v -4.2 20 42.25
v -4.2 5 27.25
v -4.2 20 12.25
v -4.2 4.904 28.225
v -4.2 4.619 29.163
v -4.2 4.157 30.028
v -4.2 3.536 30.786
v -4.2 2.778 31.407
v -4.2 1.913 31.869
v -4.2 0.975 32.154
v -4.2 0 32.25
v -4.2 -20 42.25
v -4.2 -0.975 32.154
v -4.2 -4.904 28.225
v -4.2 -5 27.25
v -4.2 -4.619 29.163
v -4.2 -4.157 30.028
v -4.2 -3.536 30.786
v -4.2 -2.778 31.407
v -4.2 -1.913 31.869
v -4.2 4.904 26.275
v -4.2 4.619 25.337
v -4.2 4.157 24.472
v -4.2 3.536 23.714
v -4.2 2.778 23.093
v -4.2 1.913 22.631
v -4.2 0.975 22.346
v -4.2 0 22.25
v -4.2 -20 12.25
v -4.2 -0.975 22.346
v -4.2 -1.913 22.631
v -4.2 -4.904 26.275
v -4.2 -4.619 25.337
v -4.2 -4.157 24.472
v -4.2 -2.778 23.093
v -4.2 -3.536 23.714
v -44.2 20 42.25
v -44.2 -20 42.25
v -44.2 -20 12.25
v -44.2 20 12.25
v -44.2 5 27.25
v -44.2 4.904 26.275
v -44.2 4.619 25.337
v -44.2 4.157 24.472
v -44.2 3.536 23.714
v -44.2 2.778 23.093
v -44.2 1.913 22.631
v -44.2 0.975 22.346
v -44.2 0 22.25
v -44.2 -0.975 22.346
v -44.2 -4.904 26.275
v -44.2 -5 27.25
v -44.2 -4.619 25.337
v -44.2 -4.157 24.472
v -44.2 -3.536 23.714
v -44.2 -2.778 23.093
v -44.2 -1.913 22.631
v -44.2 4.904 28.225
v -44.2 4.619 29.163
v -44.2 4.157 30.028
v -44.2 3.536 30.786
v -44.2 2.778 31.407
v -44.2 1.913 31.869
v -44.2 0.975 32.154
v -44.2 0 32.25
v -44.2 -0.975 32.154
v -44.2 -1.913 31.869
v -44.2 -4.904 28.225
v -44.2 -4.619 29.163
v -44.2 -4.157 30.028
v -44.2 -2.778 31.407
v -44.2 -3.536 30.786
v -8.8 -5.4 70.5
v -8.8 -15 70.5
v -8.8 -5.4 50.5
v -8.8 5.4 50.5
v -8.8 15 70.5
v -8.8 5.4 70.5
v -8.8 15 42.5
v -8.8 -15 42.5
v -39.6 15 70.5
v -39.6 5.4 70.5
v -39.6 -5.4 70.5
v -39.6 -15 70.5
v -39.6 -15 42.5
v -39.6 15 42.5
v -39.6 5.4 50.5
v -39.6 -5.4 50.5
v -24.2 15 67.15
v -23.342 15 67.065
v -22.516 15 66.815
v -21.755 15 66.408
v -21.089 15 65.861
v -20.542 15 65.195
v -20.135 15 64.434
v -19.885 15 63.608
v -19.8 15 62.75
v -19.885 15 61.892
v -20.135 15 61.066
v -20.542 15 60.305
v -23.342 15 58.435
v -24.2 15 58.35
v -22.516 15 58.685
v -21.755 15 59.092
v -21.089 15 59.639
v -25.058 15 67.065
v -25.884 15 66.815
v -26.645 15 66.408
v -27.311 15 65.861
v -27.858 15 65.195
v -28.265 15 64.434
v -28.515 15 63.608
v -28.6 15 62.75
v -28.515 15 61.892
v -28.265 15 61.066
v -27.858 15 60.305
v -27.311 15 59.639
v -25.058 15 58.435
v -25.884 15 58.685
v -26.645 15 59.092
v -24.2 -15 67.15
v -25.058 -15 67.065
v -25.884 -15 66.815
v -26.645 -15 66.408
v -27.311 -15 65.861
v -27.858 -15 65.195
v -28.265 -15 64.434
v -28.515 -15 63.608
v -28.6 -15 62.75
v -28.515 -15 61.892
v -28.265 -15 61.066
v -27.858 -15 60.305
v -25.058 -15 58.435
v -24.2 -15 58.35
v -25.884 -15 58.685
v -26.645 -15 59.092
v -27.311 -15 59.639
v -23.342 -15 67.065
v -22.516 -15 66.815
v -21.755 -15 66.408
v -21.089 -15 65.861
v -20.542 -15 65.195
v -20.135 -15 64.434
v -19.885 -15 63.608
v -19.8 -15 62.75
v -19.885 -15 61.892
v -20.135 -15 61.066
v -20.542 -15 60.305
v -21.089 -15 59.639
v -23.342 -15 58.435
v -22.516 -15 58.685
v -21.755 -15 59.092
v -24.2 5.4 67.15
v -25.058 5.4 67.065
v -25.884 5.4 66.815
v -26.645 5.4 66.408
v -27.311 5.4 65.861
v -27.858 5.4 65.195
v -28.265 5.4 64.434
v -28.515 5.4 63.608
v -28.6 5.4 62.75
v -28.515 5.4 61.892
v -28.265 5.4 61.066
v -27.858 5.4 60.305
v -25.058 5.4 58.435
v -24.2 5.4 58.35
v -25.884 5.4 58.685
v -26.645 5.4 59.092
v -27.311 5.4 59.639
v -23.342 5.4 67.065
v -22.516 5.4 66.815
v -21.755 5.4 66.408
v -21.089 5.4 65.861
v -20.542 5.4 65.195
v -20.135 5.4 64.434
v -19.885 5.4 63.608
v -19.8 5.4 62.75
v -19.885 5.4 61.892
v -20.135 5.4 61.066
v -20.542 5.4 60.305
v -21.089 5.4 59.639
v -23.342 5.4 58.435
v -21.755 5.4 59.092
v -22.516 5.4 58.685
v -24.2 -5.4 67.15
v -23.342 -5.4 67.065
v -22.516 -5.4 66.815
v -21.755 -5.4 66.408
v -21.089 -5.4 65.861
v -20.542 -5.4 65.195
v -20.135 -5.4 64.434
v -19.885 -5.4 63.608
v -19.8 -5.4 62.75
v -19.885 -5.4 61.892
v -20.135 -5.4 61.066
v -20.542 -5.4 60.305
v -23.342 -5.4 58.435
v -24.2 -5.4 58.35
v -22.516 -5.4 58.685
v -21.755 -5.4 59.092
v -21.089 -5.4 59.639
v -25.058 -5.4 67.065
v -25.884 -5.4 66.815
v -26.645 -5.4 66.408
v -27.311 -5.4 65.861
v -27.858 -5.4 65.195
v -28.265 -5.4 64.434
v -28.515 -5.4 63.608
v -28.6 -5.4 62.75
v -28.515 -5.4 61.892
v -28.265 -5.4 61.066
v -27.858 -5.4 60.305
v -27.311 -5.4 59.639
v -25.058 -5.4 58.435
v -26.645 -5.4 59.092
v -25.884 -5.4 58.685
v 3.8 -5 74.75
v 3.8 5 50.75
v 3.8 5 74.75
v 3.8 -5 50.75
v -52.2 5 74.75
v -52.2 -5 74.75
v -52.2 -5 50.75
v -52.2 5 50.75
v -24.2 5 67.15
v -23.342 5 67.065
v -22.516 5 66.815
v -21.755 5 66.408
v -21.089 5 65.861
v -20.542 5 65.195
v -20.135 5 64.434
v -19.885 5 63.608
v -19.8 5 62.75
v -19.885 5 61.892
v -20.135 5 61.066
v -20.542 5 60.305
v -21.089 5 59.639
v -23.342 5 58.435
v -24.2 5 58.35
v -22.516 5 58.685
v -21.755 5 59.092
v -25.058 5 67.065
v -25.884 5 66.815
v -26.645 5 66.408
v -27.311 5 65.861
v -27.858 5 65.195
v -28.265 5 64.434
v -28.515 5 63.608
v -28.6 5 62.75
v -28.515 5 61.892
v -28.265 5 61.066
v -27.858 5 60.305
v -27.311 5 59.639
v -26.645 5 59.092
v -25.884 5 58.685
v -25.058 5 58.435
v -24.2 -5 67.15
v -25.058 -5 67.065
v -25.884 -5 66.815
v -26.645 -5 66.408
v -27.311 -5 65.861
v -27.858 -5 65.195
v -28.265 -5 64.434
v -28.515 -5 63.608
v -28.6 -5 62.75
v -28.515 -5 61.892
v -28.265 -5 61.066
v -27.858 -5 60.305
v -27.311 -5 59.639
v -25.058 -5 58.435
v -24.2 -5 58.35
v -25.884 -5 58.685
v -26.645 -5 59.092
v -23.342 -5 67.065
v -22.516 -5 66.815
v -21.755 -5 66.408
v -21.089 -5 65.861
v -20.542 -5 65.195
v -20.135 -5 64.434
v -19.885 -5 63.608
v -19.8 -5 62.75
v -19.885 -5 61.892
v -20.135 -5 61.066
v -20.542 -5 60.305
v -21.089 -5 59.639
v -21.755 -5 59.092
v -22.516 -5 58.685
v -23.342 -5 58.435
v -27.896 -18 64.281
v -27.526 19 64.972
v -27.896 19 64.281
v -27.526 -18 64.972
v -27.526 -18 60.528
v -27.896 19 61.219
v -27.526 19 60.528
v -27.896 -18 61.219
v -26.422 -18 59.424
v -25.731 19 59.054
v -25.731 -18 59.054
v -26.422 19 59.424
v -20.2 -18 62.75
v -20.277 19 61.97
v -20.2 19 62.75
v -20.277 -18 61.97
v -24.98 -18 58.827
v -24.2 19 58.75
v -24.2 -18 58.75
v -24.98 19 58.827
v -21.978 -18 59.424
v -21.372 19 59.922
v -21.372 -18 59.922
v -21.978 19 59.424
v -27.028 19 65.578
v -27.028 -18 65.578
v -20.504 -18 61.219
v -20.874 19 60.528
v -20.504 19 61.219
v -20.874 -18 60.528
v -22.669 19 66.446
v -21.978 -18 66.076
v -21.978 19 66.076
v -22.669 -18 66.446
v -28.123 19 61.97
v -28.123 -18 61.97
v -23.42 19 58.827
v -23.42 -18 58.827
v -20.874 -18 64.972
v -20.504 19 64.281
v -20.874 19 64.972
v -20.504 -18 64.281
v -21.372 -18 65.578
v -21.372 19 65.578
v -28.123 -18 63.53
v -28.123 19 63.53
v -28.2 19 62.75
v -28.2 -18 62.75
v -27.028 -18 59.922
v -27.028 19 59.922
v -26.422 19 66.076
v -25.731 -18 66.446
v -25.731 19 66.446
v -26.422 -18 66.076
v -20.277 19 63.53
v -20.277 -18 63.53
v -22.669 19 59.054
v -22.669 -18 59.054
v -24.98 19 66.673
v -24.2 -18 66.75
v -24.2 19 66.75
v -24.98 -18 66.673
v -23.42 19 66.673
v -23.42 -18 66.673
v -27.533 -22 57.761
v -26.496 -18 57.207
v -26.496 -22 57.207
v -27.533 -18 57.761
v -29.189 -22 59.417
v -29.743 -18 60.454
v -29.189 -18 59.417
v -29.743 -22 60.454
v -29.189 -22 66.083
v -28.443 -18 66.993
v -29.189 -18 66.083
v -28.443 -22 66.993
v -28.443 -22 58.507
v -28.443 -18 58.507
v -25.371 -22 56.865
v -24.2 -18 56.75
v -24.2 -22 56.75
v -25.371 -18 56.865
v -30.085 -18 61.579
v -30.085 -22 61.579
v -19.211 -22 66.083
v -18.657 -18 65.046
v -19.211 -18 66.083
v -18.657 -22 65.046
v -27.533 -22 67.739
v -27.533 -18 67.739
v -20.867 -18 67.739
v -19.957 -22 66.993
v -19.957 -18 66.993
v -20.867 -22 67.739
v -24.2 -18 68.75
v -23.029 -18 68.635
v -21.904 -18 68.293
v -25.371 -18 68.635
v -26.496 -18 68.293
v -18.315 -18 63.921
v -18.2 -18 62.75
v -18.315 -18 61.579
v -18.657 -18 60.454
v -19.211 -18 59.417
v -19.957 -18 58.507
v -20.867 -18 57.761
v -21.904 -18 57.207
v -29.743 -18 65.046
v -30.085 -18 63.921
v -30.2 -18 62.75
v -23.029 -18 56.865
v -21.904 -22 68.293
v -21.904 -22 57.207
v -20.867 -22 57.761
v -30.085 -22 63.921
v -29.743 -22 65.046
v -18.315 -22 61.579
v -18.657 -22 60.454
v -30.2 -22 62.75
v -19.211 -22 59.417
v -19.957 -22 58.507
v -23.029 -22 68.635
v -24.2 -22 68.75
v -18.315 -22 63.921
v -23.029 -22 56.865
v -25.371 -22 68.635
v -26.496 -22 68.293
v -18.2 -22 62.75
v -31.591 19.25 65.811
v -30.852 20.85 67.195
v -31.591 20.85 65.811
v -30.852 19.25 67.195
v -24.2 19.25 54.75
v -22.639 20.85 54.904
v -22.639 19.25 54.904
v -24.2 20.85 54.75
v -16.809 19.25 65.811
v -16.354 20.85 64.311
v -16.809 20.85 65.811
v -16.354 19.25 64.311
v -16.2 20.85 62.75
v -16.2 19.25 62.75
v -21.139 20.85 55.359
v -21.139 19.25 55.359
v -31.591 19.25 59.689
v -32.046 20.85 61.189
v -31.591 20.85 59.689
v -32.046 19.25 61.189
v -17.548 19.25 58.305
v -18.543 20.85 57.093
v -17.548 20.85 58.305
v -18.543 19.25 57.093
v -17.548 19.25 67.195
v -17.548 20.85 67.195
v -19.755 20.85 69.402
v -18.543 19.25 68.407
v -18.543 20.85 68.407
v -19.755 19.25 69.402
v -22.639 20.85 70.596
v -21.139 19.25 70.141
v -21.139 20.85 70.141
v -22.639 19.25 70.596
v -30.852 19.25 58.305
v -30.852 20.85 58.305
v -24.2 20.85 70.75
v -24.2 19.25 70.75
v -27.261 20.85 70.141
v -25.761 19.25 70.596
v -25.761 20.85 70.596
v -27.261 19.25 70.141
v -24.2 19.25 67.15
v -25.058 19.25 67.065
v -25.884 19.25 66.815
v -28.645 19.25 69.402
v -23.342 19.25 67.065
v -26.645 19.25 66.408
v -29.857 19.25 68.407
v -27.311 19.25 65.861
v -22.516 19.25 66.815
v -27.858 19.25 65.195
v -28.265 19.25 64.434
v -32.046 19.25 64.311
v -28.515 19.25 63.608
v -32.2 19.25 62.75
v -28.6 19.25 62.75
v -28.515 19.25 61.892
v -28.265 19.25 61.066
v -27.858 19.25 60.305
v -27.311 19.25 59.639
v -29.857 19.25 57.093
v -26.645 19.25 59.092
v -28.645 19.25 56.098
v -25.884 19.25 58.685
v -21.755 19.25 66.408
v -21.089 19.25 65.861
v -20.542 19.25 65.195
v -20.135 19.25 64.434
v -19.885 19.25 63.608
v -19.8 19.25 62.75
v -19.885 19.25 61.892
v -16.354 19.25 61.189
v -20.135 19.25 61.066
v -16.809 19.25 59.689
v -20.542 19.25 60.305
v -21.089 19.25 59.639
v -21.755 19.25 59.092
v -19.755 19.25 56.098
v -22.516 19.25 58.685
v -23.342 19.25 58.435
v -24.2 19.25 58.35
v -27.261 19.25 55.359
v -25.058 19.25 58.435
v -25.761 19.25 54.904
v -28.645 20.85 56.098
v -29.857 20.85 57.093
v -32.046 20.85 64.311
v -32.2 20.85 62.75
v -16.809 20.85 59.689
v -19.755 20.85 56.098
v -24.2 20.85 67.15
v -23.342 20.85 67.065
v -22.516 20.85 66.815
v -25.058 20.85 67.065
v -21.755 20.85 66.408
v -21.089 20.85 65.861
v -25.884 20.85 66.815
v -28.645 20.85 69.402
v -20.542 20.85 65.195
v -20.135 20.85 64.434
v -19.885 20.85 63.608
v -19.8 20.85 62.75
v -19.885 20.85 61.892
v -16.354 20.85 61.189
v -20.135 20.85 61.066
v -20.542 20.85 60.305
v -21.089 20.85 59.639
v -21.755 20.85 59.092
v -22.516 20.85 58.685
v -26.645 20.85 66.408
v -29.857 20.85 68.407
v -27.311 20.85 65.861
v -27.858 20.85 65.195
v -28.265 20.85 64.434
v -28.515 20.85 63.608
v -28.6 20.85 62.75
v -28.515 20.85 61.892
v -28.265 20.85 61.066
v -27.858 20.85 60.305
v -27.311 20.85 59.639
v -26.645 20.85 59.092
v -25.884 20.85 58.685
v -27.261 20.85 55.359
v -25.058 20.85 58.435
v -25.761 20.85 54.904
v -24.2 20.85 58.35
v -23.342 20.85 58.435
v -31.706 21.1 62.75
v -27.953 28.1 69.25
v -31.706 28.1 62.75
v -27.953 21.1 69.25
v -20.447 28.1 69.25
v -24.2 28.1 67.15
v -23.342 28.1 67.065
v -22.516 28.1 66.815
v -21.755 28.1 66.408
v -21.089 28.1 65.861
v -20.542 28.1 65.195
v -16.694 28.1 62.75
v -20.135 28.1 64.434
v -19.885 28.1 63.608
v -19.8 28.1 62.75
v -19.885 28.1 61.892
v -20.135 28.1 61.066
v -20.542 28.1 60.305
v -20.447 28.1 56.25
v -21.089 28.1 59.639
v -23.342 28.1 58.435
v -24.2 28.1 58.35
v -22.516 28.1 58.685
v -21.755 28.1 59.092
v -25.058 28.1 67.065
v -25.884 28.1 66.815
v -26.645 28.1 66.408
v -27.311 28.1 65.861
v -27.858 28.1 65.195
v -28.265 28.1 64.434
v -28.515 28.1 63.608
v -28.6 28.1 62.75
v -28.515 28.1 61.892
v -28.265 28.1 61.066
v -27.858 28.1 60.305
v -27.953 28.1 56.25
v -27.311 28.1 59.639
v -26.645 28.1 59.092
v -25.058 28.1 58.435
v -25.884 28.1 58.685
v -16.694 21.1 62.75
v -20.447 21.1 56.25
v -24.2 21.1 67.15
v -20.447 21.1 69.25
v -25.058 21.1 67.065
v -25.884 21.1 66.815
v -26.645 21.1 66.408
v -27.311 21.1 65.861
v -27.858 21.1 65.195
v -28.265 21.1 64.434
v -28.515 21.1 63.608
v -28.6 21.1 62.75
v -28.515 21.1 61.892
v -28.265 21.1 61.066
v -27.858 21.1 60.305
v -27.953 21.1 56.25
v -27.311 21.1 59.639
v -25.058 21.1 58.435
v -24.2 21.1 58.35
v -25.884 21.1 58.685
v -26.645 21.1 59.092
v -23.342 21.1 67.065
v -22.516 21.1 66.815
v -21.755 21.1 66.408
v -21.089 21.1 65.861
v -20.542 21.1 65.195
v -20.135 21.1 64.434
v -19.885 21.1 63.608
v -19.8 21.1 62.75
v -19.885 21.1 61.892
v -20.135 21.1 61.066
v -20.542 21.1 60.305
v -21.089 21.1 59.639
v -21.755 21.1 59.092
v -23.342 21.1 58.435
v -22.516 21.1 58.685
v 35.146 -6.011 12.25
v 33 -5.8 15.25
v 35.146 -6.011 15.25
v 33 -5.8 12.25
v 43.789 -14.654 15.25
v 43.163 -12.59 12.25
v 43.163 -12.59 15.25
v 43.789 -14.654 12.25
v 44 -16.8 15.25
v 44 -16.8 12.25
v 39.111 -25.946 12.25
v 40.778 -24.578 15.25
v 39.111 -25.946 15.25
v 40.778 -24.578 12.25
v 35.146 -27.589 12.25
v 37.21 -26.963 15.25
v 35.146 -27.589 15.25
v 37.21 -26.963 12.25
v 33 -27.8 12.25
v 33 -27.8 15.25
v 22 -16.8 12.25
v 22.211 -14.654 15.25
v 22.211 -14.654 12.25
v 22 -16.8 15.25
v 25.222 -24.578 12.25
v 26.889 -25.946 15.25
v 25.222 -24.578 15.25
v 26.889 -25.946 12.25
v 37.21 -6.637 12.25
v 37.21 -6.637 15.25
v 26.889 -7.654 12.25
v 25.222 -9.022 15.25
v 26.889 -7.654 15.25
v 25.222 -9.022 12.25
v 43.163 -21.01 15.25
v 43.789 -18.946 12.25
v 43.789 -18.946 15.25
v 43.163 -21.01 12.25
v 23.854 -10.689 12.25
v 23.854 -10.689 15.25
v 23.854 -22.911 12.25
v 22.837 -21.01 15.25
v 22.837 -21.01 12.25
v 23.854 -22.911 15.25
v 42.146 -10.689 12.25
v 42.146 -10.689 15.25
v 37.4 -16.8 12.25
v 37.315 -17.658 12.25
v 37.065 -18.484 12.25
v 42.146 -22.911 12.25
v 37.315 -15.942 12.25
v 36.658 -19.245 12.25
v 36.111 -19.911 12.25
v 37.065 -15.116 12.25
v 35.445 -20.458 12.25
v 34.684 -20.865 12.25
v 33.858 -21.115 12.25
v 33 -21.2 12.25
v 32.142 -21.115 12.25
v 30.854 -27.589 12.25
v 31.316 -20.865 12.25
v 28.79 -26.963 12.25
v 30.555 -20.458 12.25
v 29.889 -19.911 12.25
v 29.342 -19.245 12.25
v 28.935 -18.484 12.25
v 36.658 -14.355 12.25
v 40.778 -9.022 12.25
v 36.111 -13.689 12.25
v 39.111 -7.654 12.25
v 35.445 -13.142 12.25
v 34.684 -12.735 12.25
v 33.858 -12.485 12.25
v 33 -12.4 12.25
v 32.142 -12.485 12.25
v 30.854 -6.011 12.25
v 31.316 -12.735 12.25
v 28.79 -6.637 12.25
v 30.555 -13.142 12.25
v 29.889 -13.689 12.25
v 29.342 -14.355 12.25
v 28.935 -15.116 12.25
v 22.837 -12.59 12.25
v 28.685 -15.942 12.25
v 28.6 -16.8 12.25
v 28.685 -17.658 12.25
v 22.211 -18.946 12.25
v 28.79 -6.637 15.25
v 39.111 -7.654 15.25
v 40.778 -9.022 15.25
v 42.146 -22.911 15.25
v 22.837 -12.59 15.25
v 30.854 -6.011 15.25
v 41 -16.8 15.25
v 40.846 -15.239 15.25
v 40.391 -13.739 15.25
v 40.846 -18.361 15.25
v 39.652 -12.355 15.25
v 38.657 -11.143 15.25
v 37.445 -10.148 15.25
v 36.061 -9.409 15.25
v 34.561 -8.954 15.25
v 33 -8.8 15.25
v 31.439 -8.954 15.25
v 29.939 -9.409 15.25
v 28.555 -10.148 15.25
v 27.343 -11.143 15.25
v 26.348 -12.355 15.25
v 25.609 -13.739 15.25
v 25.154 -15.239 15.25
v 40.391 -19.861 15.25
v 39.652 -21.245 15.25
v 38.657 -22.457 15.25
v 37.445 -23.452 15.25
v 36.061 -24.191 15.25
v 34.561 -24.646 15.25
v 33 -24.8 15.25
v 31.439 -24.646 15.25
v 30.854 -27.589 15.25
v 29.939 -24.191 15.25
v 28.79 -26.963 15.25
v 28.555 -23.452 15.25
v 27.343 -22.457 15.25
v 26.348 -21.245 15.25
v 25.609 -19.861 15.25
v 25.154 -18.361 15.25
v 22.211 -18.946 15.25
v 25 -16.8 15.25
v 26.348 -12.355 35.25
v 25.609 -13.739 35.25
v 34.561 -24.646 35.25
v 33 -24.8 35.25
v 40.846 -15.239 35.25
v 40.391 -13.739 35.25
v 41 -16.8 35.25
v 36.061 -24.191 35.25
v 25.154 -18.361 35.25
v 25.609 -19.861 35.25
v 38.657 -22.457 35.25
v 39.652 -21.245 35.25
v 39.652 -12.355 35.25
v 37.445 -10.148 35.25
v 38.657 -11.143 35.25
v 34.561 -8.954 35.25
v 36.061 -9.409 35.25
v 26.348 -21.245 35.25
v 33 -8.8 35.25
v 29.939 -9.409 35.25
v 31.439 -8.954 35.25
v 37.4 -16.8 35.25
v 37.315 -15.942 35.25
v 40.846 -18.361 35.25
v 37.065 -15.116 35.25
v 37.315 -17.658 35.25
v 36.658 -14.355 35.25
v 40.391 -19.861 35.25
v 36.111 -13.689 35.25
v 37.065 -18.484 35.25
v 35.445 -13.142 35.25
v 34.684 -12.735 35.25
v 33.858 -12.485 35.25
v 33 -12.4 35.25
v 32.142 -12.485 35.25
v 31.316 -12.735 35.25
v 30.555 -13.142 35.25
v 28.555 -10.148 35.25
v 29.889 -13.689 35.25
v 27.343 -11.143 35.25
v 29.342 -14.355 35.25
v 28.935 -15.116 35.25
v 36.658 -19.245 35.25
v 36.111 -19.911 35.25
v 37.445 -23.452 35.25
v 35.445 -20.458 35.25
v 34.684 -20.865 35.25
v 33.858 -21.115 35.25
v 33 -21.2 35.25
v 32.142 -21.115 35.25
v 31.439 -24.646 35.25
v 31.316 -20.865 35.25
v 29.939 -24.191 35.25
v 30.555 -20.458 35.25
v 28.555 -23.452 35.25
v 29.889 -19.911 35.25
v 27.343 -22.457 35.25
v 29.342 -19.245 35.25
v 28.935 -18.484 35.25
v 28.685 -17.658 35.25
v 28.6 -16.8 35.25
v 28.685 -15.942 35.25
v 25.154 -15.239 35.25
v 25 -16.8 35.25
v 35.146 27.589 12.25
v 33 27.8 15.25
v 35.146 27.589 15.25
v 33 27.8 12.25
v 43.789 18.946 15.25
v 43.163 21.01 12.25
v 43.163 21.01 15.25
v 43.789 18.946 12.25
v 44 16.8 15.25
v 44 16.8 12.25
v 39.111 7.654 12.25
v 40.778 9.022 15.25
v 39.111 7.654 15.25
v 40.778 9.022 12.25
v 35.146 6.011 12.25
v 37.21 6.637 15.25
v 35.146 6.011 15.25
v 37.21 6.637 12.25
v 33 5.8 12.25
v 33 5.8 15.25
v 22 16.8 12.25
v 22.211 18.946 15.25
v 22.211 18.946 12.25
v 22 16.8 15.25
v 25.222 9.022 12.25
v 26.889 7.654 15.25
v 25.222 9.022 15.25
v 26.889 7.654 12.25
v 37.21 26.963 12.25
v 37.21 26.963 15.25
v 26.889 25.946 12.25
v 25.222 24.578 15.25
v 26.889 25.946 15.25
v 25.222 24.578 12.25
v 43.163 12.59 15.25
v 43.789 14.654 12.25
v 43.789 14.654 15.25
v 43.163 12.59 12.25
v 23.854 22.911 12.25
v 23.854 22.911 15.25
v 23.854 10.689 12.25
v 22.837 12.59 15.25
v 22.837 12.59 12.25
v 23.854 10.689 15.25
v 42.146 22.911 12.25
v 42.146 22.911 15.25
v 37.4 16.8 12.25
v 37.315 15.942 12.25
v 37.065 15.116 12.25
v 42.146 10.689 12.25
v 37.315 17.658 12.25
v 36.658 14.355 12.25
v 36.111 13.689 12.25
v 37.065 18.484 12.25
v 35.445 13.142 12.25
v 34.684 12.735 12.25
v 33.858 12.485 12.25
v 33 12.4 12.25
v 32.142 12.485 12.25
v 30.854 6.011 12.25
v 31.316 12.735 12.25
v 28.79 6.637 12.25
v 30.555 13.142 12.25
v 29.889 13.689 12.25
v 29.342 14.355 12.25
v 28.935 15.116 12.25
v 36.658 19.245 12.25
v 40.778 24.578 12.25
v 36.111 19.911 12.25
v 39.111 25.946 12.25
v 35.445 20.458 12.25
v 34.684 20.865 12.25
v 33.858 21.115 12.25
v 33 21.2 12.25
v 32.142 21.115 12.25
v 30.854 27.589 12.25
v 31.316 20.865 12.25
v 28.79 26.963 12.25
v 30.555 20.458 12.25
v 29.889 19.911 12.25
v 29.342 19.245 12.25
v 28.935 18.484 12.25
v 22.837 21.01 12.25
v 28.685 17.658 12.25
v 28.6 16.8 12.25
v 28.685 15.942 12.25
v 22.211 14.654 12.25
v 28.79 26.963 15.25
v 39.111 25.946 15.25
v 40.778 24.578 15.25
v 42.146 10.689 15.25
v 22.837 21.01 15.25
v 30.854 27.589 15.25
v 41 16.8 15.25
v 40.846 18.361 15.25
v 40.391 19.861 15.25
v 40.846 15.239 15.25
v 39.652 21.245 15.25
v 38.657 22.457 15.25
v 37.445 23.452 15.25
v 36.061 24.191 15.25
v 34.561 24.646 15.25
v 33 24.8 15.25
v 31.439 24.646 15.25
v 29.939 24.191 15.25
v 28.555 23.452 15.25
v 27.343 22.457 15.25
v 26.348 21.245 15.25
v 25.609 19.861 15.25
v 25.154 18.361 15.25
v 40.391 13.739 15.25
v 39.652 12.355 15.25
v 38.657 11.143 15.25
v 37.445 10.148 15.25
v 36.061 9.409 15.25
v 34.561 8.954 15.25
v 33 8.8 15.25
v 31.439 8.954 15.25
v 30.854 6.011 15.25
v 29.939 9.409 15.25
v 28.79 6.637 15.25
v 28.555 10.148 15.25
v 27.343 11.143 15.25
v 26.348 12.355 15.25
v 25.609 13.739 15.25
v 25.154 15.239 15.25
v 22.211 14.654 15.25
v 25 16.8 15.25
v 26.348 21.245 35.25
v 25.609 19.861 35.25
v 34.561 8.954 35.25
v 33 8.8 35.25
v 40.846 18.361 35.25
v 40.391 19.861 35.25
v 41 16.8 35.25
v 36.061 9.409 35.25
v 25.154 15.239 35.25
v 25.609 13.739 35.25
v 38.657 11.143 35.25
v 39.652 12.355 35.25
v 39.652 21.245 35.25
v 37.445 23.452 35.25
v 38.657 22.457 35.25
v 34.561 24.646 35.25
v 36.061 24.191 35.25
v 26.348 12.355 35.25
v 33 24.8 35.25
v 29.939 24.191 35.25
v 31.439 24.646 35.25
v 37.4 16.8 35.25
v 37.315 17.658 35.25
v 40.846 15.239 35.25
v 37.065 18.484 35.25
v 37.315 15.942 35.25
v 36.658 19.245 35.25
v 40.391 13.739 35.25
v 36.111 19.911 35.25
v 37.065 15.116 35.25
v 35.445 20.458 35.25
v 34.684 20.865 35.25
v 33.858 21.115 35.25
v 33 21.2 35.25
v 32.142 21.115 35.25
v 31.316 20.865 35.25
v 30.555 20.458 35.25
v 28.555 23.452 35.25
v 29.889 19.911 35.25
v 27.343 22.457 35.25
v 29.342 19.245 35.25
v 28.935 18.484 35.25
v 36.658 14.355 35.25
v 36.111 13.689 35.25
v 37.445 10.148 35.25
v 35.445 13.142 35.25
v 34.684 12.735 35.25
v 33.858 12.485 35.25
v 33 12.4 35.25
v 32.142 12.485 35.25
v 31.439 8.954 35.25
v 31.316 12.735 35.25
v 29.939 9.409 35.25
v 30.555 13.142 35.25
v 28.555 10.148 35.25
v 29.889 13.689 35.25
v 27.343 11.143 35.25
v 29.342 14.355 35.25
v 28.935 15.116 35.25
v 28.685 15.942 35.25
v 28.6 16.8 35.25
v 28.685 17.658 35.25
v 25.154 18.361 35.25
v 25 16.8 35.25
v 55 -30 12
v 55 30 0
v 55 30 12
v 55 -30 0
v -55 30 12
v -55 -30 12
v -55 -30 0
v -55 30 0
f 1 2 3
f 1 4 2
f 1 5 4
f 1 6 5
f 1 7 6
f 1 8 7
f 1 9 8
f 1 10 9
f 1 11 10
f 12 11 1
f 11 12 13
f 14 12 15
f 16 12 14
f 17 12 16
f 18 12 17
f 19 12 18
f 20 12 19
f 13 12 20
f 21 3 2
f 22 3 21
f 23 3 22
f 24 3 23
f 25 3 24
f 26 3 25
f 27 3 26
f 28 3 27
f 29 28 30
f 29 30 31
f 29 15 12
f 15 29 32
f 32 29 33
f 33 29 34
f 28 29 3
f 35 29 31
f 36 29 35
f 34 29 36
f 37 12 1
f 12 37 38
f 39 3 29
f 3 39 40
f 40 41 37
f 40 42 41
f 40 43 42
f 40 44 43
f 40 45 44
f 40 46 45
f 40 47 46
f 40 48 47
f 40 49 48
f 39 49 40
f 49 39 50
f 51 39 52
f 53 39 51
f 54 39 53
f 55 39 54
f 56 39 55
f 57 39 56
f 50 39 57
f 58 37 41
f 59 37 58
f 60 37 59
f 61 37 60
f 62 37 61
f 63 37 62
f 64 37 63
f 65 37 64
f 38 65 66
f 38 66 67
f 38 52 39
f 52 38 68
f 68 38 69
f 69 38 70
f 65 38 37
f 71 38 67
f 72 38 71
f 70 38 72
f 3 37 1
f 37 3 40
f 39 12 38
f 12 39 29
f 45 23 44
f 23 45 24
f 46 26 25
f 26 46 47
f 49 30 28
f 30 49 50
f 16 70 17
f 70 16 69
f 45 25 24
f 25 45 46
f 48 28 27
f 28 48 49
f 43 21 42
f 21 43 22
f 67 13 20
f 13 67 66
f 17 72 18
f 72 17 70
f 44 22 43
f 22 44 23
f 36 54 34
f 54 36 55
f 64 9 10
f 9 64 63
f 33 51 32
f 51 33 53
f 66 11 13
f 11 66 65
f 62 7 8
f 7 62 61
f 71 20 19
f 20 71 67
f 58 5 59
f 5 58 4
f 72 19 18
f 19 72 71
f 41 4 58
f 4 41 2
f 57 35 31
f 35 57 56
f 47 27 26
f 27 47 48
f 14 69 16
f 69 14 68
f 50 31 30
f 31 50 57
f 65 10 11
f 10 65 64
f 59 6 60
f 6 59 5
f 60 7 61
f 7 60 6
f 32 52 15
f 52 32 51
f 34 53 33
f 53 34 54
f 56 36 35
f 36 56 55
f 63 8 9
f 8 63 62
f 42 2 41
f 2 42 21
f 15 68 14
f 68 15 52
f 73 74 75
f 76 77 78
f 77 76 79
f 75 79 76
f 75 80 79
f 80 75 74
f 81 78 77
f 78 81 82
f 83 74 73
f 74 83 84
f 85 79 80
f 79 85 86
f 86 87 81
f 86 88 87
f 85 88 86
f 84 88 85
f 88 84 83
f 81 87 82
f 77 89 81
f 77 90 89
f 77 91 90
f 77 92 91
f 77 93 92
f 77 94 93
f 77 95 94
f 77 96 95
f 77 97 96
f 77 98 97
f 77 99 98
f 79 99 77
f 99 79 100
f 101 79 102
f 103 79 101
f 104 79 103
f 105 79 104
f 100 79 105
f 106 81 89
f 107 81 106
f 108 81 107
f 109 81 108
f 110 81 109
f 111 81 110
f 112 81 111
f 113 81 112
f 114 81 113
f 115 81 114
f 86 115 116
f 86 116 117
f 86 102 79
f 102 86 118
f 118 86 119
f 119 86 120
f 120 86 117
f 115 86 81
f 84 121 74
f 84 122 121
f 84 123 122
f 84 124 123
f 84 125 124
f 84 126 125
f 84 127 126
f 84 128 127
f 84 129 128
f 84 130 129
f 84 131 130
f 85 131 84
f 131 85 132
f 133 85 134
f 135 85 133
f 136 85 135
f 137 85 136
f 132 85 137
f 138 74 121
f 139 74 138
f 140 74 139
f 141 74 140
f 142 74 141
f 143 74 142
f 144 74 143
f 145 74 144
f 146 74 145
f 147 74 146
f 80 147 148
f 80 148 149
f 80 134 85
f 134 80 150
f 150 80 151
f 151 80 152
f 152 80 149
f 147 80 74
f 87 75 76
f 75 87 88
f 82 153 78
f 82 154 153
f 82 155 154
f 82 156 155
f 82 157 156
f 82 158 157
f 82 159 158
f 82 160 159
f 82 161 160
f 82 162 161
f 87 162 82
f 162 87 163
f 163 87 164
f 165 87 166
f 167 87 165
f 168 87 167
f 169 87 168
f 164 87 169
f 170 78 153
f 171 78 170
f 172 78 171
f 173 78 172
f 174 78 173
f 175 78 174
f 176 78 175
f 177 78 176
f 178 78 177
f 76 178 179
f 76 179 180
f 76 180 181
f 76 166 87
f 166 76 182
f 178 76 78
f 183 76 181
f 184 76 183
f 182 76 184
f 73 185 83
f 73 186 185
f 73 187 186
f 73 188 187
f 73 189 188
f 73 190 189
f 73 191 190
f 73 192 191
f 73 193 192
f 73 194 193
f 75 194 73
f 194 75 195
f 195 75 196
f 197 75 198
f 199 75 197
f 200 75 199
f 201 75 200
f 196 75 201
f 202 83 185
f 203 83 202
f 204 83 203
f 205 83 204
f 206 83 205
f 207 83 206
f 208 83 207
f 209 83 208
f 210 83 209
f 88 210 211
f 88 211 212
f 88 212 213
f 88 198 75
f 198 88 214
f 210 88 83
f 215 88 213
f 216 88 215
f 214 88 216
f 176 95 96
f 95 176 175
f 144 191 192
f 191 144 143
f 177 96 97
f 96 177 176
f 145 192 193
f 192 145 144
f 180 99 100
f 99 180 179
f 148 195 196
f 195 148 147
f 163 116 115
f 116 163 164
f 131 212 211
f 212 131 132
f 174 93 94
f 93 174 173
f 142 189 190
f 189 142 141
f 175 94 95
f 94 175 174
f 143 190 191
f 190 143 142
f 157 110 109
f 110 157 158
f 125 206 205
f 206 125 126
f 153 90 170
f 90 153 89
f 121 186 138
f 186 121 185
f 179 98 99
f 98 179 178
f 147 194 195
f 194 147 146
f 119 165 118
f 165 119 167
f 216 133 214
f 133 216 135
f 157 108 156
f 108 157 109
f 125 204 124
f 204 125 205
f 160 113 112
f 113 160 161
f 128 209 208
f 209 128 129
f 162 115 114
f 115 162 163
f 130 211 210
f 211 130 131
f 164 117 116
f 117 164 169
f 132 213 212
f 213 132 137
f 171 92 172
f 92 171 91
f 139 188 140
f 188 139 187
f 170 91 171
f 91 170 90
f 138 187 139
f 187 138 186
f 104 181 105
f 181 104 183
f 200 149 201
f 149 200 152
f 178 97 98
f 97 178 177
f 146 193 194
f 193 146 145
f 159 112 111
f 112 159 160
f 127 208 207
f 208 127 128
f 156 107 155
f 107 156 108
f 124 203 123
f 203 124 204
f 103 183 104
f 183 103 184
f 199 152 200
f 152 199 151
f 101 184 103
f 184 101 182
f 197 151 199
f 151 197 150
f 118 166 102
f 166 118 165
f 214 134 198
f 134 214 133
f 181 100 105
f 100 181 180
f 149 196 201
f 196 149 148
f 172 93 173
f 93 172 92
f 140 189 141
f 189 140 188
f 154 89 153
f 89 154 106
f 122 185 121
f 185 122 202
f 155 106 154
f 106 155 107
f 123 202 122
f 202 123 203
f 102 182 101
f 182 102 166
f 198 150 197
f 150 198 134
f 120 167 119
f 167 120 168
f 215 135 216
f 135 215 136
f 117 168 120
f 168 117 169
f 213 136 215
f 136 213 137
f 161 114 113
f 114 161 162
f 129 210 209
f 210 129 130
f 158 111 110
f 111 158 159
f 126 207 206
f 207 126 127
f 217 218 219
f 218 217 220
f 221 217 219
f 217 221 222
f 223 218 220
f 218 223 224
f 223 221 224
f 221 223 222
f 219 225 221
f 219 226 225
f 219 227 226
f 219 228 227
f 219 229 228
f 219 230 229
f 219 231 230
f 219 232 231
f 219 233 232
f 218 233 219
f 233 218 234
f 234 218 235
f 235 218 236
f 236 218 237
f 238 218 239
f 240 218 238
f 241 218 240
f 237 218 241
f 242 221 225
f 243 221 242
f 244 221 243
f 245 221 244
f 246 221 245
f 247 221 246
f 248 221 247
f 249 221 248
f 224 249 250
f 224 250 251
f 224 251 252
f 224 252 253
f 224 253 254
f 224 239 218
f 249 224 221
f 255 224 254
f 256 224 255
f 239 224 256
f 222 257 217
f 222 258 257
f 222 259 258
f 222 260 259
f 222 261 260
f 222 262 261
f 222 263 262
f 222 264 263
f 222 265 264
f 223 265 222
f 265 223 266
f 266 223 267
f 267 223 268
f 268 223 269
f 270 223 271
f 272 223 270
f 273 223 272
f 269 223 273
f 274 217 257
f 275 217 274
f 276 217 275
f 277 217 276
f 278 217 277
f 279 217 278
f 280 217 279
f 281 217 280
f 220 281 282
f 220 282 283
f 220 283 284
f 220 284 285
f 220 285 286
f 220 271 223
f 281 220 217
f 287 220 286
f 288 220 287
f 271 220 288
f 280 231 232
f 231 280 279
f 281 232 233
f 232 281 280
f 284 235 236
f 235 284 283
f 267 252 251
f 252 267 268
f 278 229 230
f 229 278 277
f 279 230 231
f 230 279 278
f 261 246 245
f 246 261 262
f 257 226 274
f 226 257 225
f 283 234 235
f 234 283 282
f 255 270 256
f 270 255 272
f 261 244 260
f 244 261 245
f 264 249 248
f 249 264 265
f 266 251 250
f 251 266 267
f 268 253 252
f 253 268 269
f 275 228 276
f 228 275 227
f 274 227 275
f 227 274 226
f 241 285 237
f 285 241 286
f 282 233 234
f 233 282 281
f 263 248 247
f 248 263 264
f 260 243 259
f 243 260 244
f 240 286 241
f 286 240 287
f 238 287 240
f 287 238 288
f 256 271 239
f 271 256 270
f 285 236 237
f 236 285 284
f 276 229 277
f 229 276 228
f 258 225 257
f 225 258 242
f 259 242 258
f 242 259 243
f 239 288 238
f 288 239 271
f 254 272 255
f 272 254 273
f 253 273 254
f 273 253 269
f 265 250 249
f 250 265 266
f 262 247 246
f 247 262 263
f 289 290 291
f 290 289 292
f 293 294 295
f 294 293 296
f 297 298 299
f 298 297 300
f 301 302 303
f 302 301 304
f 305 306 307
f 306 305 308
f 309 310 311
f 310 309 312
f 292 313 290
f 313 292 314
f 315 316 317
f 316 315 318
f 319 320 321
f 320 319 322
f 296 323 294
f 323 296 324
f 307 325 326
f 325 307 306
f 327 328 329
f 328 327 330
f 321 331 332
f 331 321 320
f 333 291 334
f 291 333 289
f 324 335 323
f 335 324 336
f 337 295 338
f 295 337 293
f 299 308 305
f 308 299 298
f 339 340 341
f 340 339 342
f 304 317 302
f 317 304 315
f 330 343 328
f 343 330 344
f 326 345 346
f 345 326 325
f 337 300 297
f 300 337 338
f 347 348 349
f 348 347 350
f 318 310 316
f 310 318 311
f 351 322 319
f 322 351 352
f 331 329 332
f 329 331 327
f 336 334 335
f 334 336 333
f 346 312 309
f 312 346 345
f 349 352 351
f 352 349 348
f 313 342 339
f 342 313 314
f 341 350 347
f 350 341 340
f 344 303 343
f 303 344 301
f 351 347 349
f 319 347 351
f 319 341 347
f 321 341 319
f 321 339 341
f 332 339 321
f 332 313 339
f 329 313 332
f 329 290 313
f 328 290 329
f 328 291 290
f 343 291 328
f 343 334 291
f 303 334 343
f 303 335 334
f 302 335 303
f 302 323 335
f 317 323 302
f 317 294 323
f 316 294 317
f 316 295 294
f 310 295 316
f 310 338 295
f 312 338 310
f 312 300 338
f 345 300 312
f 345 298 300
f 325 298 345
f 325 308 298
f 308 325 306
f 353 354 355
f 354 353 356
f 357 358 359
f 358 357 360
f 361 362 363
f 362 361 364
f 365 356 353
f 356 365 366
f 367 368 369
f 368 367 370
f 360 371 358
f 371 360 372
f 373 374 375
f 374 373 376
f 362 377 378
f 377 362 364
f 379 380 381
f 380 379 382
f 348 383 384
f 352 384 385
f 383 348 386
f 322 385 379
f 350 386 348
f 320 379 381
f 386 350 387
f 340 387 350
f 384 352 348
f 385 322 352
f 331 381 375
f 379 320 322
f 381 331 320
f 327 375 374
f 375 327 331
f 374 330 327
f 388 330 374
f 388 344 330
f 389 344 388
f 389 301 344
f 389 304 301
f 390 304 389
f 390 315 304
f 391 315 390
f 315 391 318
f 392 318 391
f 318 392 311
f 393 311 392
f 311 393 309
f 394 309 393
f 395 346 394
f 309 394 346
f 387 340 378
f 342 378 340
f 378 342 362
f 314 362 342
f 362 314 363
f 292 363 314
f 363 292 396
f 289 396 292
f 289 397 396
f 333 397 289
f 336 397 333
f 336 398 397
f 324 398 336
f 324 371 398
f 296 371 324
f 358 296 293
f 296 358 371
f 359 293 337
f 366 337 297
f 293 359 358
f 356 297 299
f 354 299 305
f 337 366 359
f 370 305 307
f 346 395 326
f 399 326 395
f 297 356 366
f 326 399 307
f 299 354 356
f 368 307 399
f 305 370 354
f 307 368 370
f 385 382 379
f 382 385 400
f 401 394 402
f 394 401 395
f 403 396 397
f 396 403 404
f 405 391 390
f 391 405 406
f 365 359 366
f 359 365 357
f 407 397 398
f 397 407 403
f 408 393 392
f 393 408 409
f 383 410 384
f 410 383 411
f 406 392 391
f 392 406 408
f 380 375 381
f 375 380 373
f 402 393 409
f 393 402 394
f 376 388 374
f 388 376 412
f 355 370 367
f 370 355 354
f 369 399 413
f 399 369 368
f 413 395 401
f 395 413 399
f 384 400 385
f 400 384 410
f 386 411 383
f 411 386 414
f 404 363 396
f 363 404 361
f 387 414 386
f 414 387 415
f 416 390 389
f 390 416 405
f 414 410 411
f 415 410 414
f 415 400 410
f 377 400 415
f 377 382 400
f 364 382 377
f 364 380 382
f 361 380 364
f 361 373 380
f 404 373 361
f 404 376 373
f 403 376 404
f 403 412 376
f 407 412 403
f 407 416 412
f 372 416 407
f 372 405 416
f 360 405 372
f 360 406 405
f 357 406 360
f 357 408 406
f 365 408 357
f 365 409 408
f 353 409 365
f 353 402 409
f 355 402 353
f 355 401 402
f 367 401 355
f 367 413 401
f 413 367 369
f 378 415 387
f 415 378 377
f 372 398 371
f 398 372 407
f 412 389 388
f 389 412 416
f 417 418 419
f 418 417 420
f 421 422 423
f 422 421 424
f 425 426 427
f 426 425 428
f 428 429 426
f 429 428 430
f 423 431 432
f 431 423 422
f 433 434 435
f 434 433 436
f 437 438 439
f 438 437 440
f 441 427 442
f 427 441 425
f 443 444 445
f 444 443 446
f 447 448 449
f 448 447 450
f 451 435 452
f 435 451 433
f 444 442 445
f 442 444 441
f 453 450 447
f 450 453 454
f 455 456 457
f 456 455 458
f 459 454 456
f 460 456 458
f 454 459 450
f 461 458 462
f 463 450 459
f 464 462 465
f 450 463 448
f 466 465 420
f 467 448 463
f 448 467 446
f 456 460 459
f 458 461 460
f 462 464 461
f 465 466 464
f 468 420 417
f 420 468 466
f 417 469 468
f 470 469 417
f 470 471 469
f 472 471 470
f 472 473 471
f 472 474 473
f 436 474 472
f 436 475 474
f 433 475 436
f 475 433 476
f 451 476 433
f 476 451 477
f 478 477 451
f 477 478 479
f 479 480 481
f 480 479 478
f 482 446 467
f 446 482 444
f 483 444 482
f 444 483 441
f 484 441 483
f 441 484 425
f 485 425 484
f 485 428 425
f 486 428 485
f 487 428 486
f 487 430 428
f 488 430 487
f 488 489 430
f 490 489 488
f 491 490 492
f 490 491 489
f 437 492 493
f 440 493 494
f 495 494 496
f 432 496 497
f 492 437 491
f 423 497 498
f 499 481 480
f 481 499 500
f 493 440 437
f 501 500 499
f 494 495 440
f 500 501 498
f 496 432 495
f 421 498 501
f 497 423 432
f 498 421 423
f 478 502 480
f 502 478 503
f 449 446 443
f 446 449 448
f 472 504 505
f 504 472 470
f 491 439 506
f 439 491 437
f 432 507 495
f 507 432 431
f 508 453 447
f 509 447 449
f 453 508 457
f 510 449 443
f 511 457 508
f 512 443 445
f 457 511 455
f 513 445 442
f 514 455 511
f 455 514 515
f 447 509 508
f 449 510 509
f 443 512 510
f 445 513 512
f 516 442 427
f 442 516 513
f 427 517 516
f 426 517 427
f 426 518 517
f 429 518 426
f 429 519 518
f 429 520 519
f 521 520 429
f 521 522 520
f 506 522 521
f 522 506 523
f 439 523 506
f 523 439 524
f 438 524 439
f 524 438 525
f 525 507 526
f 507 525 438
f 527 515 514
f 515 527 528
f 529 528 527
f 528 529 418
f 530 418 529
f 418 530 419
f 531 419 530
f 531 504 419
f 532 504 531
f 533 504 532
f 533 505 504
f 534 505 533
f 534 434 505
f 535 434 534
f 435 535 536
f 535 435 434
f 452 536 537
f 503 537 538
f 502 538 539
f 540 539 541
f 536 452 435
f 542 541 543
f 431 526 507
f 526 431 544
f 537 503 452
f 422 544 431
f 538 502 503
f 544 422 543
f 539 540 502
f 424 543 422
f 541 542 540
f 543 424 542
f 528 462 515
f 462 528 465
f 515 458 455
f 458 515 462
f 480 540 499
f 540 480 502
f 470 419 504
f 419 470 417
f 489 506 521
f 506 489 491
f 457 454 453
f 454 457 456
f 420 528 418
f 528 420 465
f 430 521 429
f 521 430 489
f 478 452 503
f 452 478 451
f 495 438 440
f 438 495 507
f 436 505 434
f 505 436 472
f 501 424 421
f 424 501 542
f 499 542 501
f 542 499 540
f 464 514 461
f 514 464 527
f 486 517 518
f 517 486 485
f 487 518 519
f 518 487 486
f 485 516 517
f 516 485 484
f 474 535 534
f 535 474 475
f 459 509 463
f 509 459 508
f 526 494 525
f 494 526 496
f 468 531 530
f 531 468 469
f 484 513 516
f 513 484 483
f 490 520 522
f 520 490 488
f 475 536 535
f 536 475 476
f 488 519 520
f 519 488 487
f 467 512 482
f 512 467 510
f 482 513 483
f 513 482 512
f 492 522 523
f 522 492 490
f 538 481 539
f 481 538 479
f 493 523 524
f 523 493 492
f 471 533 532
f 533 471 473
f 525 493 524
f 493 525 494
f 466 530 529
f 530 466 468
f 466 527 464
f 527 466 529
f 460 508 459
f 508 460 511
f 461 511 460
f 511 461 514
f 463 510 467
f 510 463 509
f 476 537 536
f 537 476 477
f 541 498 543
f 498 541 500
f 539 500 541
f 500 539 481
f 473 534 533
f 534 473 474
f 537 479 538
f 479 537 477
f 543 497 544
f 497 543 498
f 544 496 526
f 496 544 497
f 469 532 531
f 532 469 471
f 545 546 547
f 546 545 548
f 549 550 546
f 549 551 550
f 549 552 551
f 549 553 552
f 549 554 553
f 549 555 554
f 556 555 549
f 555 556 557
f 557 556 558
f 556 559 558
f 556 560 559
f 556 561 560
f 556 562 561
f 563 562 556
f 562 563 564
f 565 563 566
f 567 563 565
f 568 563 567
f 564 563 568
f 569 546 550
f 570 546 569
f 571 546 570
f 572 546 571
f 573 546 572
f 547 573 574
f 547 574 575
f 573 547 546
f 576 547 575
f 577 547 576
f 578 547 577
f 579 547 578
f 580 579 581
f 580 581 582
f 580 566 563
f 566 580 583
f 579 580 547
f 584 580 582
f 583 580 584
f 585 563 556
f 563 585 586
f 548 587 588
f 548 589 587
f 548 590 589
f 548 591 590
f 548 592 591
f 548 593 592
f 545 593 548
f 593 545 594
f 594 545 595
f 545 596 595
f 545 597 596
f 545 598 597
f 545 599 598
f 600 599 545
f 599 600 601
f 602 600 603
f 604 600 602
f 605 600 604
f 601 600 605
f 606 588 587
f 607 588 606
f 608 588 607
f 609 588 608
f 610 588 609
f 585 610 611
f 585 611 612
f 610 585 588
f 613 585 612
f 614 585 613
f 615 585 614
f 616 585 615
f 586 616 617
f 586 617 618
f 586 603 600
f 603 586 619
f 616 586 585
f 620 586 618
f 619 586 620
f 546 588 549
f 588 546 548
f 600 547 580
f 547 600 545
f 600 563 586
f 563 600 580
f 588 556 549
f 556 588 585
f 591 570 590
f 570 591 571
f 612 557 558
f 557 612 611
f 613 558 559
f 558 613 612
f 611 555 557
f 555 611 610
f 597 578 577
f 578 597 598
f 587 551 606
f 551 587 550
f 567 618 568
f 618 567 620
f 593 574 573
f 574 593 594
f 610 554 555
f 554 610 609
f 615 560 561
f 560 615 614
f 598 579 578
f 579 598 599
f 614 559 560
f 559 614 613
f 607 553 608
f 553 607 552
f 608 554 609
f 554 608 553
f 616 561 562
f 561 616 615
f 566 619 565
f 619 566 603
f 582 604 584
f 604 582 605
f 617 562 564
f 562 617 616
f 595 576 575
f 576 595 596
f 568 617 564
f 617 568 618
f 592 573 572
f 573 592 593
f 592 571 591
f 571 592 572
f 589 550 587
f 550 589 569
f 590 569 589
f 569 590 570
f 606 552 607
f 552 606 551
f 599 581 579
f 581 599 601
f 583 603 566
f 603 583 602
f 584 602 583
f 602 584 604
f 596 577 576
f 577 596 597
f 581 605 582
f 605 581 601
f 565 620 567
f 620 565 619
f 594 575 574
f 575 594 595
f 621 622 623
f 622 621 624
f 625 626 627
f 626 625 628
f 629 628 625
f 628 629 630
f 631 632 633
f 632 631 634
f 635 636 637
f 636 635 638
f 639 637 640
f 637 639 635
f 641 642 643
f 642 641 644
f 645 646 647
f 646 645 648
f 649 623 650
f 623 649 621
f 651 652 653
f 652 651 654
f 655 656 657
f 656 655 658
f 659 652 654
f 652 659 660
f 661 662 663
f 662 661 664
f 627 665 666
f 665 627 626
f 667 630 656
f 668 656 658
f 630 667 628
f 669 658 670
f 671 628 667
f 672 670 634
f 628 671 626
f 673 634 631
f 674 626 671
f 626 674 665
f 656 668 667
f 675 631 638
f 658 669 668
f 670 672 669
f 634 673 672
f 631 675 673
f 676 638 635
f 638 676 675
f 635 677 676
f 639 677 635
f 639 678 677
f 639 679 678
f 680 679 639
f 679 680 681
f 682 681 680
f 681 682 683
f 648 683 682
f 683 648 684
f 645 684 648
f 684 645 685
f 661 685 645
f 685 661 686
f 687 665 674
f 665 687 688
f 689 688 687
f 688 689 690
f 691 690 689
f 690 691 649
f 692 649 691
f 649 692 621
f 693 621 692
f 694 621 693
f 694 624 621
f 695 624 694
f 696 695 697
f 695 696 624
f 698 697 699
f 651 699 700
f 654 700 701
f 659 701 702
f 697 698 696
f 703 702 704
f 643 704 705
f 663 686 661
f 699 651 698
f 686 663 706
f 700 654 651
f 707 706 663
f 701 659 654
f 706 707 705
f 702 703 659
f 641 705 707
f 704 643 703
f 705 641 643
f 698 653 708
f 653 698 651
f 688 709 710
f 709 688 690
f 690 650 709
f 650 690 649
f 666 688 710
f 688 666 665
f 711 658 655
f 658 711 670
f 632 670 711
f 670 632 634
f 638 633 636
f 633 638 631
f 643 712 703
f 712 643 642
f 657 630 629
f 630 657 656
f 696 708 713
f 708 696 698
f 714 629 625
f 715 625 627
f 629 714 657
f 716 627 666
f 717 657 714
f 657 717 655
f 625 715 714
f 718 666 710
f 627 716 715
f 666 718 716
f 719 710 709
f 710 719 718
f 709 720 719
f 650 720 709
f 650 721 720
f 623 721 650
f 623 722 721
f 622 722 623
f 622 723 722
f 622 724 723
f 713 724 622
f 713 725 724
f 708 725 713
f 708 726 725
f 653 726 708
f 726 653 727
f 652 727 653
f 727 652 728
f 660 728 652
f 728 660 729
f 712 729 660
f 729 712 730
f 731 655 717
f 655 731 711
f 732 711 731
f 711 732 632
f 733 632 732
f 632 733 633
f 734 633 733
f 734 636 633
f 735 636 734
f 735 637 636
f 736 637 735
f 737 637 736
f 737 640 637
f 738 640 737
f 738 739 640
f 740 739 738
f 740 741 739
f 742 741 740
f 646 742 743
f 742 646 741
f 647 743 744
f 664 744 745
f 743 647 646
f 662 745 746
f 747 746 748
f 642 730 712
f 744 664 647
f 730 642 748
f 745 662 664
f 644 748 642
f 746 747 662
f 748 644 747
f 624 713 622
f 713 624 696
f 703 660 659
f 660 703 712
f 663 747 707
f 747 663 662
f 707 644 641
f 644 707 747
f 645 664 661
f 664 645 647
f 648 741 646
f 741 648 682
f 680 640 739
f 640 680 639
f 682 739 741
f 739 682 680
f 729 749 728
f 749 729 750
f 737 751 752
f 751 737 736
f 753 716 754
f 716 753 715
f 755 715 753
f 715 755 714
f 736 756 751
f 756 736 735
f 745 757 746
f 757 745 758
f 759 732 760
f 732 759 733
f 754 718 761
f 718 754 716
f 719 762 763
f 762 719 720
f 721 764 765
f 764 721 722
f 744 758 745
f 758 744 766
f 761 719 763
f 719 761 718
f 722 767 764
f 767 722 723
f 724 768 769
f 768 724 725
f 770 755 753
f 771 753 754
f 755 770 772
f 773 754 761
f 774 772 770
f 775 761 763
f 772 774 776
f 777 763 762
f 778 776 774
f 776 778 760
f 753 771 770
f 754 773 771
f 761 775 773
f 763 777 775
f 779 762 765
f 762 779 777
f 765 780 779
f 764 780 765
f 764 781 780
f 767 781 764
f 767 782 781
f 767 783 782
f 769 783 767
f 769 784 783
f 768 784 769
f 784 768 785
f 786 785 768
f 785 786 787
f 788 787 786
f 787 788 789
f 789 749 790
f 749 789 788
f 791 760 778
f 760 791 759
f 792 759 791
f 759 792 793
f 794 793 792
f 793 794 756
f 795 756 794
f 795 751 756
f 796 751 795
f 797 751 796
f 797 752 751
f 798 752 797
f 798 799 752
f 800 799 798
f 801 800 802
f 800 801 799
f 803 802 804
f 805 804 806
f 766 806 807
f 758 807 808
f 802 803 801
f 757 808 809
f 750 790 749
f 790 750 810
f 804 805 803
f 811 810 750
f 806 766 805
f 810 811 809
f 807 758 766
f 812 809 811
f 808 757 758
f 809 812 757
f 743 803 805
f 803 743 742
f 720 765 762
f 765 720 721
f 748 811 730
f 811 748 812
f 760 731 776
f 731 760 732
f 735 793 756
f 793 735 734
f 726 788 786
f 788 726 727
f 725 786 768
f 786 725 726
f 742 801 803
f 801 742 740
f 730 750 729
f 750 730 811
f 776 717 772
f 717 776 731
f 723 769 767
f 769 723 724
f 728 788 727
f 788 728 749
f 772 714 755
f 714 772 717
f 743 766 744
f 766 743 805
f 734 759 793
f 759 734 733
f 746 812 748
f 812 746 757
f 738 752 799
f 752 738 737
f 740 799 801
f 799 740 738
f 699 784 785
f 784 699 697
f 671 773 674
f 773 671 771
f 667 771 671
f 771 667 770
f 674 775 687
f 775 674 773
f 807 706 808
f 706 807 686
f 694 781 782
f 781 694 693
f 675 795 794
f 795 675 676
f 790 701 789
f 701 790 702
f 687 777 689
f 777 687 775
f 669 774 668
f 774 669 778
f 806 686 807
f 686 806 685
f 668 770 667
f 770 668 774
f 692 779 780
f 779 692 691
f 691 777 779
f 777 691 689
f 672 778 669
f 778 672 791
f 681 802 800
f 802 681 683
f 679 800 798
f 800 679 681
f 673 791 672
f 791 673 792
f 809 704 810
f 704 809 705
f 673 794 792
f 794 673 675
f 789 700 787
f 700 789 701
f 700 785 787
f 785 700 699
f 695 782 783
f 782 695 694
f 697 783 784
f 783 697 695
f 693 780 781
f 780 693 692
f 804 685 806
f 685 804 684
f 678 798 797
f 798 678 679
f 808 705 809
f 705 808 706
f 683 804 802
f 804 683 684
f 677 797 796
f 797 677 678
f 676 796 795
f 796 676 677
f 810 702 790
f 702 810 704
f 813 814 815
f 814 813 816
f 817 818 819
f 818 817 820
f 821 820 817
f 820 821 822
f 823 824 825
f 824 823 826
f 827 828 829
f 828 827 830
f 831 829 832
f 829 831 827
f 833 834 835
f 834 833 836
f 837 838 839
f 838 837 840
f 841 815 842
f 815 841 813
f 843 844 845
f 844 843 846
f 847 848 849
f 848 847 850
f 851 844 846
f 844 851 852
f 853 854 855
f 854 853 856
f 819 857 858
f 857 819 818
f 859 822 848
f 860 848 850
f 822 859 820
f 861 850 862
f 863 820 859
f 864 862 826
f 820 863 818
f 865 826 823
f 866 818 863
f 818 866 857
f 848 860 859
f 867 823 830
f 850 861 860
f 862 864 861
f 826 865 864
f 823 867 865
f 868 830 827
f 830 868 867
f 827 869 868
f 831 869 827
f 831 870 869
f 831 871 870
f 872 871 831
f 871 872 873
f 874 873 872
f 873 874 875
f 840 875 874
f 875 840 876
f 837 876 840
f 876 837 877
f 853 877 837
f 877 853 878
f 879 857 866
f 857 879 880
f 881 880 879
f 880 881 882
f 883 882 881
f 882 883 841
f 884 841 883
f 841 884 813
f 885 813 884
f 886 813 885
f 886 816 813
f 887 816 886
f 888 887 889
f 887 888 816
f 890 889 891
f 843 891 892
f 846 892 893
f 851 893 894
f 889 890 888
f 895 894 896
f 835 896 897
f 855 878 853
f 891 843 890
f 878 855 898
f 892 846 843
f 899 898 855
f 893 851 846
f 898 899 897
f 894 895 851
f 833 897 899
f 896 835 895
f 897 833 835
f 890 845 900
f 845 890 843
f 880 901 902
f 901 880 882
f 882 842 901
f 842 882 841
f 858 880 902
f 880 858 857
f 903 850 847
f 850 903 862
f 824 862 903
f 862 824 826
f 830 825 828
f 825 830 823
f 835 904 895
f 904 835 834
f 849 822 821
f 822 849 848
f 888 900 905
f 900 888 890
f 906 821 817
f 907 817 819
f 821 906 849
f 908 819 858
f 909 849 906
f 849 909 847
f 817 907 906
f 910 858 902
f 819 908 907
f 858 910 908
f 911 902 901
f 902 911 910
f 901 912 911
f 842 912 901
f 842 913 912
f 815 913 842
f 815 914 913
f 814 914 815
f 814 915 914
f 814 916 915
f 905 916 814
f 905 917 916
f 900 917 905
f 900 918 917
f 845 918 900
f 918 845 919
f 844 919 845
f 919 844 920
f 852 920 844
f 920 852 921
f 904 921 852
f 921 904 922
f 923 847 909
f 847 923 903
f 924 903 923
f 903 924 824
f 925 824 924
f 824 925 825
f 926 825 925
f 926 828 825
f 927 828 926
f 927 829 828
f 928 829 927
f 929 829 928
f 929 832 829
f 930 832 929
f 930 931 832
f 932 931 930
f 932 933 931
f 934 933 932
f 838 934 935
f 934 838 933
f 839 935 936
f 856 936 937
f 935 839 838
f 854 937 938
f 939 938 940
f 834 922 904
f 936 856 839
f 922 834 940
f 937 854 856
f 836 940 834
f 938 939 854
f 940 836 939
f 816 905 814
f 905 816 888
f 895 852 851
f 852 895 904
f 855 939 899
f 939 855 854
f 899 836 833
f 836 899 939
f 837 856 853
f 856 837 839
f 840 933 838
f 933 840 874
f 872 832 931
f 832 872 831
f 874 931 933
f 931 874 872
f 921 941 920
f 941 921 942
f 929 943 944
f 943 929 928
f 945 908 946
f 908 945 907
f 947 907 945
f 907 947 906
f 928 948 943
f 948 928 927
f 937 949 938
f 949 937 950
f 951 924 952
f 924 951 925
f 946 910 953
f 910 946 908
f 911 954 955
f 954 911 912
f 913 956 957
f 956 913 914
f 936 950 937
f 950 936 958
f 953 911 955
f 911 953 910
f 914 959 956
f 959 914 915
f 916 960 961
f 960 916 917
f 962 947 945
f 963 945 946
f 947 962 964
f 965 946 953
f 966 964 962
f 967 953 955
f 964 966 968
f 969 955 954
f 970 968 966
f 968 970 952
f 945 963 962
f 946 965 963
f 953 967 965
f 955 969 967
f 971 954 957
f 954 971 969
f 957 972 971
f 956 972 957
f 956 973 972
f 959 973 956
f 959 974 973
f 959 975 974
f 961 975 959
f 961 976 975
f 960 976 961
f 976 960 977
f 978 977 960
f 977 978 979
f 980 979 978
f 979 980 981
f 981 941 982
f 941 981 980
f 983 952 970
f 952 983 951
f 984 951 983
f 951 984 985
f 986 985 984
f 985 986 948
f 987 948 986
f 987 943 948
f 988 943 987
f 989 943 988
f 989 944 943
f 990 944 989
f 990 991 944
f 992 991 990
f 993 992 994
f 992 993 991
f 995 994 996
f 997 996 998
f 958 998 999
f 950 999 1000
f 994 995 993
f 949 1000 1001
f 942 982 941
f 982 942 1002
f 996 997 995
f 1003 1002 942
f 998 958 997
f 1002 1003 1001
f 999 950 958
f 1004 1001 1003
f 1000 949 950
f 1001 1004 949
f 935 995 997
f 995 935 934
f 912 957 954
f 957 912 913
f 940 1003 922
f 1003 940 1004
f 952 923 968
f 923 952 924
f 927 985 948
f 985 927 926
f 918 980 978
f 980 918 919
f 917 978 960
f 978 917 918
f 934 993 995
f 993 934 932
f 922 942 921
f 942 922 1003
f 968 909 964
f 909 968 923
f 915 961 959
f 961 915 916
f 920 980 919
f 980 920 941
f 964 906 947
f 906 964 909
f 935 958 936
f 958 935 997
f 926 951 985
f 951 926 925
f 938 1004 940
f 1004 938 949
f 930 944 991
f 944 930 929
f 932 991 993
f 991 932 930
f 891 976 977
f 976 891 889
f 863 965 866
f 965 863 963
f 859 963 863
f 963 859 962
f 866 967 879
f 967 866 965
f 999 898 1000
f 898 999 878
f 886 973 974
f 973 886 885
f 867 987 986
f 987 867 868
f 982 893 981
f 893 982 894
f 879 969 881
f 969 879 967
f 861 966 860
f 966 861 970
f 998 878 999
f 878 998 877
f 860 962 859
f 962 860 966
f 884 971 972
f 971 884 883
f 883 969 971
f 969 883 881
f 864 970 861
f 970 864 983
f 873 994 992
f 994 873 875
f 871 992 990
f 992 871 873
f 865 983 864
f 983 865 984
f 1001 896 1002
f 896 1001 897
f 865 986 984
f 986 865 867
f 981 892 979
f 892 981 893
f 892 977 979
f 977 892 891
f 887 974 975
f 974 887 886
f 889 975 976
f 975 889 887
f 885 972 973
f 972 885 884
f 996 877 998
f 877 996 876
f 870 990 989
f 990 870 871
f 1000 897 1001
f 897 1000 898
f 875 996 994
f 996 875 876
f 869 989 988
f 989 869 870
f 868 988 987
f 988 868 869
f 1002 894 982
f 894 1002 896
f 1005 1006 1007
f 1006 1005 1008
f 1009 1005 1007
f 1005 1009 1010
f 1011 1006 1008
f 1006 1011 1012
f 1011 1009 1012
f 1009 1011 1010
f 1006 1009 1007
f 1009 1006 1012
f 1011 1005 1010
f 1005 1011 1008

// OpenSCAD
$fn = 32;

// ------------------------------------------------------------------------
// Indexing jig: plate 110 x 60 mm, pin d8
// Every part is its own module, assembly() places every instance.
// ------------------------------------------------------------------------

// --- part 1 ---
module jig_plate() {
  difference() {
    translate([-55, -30, 0]) cube([110, 60, 12]);
  }
}

// --- part 2 ---
module locator_block() {
  difference() {
    translate([-20, -20, 0]) cube([40, 40, 30]);
    translate([0, 0, 15]) rotate([0, 90, 0]) cylinder(h = 42, d = 10, center = true);
  }
}

// --- part 3 ---
module index_fork() {
  difference() {
    translate([-15.4, -15, 0]) cube([30.8, 30, 28]);
    translate([-16.4, -5.4, 8]) cube([32.8, 10.8, 21]);
    translate([0, 0, 20.25]) rotate([90, 0, 0]) cylinder(h = 32, d = 8.8, center = true);
  }
}

// --- part 4 ---
module index_arm() {
  difference() {
    translate([-28, -5, 0]) cube([56, 10, 24]);
    translate([0, 0, 12]) rotate([90, 0, 0]) cylinder(h = 12, d = 8.8, center = true);
  }
}

// --- part 5 ---
module index_pin() {
  rotate([0, 90, 0]) cylinder(h = 38, d = 8, center = true);
  translate([-22, 0, 0]) rotate([0, 90, 0]) cylinder(h = 4, d = 12);
}

// --- part 6 ---
module pin_washer() {
  difference() {
      translate([0, 0, 0]) cylinder(h = 1.6, d = 16);
      translate([0, 0, -1]) cylinder(h = 3.6, d = 8.8);
    }
}

// --- part 7 ---
module lock_nut() {
  difference() {
    linear_extrude(height = 7) polygon(points = [[7.506, 0], [3.753, 6.5], [-3.753, 6.5], [-7.506, 0], [-3.753, -6.5], [3.753, -6.5]]);
    translate([0, 0, -1]) cylinder(h = 9, d = 8.8);
  }
}

// --- part 8 ---
module guide_bush_a() {
  difference() {
    union() {
      cylinder(h = 3, d = 22);
      translate([0, 0, 3]) cylinder(h = 20, d = 16);
    }
    translate([0, 0, -1]) cylinder(h = 25, d = 8.8);
  }
}

// --- part 9 ---
module guide_bush_b() {
  difference() {
    union() {
      cylinder(h = 3, d = 22);
      translate([0, 0, 3]) cylinder(h = 20, d = 16);
    }
    translate([0, 0, -1]) cylinder(h = 25, d = 8.8);
  }
}

// --- assembly ---
module assembly() {
  color([0.80, 0.24, 0.20]) translate([0, 0, 0]) rotate([0, 0, 0]) jig_plate();
  color([0.20, 0.45, 0.75]) translate([-24.2, 0, 12.25]) rotate([0, 0, 0]) locator_block();
  color([0.25, 0.62, 0.32]) translate([-24.2, 0, 42.5]) rotate([0, 0, 0]) index_fork();
  color([0.92, 0.70, 0.18]) translate([-24.2, 0, 50.75]) rotate([0, 0, 0]) index_arm();
  color([0.58, 0.35, 0.70]) translate([-24.2, 0, 62.75]) rotate([0, 0, 90]) index_pin();
  color([0.16, 0.66, 0.66]) translate([-24.2, 20.85, 62.75]) rotate([90, 0, 0]) pin_washer();
  color([0.85, 0.48, 0.18]) translate([-24.2, 28.1, 62.75]) rotate([90, 0, 0]) lock_nut();
  color([0.55, 0.60, 0.65]) translate([33, -16.8, 12.25]) rotate([0, 0, 0]) guide_bush_a();
  color([0.75, 0.30, 0.55]) translate([33, 16.8, 12.25]) rotate([0, 0, 0]) guide_bush_b();
}

assembly();
